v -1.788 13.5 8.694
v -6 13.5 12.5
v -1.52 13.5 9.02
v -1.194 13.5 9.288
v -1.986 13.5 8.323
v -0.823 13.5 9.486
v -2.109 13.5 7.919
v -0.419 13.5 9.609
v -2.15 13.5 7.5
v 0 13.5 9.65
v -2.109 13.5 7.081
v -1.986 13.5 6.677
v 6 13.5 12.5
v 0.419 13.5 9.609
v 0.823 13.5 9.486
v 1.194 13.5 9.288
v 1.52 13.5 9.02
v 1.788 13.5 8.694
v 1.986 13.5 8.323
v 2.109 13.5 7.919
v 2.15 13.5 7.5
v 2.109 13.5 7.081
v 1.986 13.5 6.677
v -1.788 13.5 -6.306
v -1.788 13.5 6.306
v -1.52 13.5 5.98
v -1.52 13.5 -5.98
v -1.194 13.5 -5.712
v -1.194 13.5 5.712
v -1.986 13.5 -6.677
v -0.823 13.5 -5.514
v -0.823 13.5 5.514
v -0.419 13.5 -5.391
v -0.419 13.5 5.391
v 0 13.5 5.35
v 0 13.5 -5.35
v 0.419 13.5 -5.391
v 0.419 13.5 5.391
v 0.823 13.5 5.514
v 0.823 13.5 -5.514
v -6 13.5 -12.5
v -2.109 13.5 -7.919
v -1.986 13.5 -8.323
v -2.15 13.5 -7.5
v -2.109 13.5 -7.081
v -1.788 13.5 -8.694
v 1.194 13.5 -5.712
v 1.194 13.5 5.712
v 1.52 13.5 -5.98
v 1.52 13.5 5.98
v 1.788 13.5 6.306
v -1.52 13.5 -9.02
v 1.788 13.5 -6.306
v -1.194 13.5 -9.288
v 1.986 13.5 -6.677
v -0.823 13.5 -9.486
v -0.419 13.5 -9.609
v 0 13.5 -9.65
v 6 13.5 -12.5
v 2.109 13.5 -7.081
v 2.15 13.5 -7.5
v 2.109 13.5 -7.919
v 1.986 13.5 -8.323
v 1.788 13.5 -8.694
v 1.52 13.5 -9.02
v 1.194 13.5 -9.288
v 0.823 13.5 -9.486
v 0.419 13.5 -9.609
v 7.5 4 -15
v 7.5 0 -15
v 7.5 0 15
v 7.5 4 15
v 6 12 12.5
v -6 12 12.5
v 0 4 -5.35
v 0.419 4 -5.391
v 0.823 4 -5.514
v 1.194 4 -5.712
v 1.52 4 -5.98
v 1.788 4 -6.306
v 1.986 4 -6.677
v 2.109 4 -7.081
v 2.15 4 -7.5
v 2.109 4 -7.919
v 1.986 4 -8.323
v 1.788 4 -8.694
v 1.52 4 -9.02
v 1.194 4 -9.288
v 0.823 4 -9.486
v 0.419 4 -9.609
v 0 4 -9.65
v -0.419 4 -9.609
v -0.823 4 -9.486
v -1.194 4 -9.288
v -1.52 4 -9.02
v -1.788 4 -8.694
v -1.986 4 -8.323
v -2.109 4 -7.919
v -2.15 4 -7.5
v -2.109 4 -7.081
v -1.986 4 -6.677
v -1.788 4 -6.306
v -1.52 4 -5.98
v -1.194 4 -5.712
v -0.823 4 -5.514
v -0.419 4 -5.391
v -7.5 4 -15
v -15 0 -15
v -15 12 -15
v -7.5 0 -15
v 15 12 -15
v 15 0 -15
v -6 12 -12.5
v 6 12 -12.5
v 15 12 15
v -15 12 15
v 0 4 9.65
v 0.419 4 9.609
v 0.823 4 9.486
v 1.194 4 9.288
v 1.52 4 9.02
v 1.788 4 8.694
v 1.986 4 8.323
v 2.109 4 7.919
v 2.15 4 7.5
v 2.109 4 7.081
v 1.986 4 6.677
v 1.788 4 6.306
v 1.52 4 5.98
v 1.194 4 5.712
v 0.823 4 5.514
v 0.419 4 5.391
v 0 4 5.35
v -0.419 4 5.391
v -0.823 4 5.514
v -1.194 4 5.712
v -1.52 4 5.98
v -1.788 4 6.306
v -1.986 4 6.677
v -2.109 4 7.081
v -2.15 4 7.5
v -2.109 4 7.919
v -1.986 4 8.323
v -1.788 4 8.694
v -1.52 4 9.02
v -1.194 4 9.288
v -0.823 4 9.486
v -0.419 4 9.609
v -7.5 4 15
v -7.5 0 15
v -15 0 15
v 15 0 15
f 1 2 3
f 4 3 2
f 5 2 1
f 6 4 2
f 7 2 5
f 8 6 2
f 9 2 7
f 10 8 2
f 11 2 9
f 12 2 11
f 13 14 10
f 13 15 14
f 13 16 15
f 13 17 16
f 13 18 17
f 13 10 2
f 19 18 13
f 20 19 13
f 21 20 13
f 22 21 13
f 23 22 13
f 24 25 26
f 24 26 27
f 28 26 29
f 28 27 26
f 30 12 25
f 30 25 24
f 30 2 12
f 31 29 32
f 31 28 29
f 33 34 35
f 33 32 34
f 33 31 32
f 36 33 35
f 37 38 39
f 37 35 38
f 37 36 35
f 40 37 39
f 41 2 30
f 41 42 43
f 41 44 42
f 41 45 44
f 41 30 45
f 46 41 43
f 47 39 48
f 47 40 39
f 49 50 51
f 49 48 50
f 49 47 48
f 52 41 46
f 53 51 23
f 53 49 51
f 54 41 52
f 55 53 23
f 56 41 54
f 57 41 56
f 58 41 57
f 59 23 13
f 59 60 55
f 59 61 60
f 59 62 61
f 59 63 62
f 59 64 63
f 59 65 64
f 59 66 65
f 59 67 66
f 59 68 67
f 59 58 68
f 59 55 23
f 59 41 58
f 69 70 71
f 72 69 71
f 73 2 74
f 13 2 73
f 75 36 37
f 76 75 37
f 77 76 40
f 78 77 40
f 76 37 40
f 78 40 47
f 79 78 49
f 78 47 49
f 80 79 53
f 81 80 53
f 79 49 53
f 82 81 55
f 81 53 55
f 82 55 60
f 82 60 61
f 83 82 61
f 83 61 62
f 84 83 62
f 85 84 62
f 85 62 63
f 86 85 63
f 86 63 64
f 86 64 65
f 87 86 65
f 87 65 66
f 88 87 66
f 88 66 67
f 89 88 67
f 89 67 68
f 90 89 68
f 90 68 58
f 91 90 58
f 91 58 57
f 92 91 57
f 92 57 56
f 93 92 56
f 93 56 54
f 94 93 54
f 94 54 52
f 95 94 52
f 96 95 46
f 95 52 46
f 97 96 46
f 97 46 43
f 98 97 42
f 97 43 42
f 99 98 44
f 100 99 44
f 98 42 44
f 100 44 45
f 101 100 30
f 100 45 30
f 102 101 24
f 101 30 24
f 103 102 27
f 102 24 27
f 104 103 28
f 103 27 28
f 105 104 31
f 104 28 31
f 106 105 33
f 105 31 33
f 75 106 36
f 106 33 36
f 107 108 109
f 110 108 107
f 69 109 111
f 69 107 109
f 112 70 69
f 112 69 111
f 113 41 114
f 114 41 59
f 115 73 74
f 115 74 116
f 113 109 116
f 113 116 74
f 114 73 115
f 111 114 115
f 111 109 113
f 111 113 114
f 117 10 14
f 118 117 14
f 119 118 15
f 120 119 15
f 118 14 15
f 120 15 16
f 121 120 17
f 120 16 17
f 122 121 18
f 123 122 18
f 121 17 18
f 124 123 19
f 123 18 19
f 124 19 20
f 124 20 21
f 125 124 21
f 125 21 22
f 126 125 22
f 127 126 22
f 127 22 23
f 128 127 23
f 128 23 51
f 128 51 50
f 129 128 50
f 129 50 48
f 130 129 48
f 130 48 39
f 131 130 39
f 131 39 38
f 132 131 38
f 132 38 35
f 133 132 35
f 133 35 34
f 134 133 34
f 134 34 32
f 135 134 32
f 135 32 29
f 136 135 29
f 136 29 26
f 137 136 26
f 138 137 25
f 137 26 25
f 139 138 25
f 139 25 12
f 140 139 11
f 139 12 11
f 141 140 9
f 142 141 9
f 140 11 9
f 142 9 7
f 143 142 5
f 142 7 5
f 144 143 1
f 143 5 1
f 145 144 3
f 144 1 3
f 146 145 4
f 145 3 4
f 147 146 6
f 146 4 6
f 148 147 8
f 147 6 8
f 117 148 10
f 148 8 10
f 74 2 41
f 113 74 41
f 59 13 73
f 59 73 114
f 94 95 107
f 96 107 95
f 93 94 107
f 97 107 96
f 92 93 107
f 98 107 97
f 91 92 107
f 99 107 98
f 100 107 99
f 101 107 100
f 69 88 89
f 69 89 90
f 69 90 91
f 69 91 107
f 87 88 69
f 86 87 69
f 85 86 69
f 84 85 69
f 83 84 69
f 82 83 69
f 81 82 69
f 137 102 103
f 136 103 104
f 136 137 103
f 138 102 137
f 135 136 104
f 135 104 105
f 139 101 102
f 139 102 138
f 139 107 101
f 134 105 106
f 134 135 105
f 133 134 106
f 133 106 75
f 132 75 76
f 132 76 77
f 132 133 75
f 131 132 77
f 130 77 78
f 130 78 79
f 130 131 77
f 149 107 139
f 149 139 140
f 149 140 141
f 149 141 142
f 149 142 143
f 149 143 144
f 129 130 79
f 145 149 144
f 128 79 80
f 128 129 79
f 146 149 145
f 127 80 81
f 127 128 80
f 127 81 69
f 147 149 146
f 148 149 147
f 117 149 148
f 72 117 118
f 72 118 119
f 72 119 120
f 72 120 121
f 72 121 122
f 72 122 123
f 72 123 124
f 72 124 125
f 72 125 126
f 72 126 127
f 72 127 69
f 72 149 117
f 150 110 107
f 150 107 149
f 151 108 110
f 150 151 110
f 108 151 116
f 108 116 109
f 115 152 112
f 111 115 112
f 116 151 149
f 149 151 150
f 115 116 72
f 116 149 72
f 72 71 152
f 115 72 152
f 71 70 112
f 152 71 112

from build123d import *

# Parameters (mm, degrees)
SKETCH1_W           = 30
SKETCH1_H           = 30
BOSS_EXTRUDE1_DEPTH = 12
SKETCH2_R           = 2.15
CUT_EXTRUDE1_DEPTH  = 25.372115214
BOSS_EXTRUDE2_START = 1.5
SKETCH2_3_W         = 12
SKETCH2_3_H         = 25
SKETCH2_3_R         = 2.15
BOSS_EXTRUDE2_DEPTH = 1.5
SKETCH3_W           = 15
SKETCH3_H           = 30
CUT_EXTRUDE2_DEPTH  = 4


with BuildPart() as part:
    # Sketch1 → Boss-Extrude1 (new body)
    with BuildSketch(Plane(origin=(0, 0, 0), x_dir=(1, 0, 0), z_dir=(0, 1, 0))):
        Rectangle(SKETCH1_W, SKETCH1_H)
    extrude(amount=BOSS_EXTRUDE1_DEPTH)

    # Sketch2 → Cut-Extrude1 (cut, through all)
    with BuildSketch(Plane(origin=(0, 12, 0), x_dir=(1, 0, 0), z_dir=(0, 1, 0))):
        with Locations((0, -7.5)):
            Circle(SKETCH2_R)
        with Locations((0, 7.5)):
            Circle(SKETCH2_R)
    extrude(amount=-CUT_EXTRUDE1_DEPTH, mode=Mode.SUBTRACT)

    # Sketch2<3> → Boss-Extrude2 (add)
    with BuildSketch(Plane(origin=(0, 12, 0), x_dir=(1, 0, 0), z_dir=(0, 1, 0)).offset(BOSS_EXTRUDE2_START)):
        Rectangle(SKETCH2_3_W, SKETCH2_3_H)
        with Locations((0, -7.5)):
            Circle(SKETCH2_3_R, mode=Mode.SUBTRACT)
        with Locations((0, 7.5)):
            Circle(SKETCH2_3_R, mode=Mode.SUBTRACT)
    extrude(amount=-BOSS_EXTRUDE2_DEPTH)

    # Sketch3 → Cut-Extrude2 (cut)
    with BuildSketch(Plane.XZ):
        Rectangle(SKETCH3_W, SKETCH3_H)
    extrude(amount=-CUT_EXTRUDE2_DEPTH, mode=Mode.SUBTRACT)


solid = part.part
